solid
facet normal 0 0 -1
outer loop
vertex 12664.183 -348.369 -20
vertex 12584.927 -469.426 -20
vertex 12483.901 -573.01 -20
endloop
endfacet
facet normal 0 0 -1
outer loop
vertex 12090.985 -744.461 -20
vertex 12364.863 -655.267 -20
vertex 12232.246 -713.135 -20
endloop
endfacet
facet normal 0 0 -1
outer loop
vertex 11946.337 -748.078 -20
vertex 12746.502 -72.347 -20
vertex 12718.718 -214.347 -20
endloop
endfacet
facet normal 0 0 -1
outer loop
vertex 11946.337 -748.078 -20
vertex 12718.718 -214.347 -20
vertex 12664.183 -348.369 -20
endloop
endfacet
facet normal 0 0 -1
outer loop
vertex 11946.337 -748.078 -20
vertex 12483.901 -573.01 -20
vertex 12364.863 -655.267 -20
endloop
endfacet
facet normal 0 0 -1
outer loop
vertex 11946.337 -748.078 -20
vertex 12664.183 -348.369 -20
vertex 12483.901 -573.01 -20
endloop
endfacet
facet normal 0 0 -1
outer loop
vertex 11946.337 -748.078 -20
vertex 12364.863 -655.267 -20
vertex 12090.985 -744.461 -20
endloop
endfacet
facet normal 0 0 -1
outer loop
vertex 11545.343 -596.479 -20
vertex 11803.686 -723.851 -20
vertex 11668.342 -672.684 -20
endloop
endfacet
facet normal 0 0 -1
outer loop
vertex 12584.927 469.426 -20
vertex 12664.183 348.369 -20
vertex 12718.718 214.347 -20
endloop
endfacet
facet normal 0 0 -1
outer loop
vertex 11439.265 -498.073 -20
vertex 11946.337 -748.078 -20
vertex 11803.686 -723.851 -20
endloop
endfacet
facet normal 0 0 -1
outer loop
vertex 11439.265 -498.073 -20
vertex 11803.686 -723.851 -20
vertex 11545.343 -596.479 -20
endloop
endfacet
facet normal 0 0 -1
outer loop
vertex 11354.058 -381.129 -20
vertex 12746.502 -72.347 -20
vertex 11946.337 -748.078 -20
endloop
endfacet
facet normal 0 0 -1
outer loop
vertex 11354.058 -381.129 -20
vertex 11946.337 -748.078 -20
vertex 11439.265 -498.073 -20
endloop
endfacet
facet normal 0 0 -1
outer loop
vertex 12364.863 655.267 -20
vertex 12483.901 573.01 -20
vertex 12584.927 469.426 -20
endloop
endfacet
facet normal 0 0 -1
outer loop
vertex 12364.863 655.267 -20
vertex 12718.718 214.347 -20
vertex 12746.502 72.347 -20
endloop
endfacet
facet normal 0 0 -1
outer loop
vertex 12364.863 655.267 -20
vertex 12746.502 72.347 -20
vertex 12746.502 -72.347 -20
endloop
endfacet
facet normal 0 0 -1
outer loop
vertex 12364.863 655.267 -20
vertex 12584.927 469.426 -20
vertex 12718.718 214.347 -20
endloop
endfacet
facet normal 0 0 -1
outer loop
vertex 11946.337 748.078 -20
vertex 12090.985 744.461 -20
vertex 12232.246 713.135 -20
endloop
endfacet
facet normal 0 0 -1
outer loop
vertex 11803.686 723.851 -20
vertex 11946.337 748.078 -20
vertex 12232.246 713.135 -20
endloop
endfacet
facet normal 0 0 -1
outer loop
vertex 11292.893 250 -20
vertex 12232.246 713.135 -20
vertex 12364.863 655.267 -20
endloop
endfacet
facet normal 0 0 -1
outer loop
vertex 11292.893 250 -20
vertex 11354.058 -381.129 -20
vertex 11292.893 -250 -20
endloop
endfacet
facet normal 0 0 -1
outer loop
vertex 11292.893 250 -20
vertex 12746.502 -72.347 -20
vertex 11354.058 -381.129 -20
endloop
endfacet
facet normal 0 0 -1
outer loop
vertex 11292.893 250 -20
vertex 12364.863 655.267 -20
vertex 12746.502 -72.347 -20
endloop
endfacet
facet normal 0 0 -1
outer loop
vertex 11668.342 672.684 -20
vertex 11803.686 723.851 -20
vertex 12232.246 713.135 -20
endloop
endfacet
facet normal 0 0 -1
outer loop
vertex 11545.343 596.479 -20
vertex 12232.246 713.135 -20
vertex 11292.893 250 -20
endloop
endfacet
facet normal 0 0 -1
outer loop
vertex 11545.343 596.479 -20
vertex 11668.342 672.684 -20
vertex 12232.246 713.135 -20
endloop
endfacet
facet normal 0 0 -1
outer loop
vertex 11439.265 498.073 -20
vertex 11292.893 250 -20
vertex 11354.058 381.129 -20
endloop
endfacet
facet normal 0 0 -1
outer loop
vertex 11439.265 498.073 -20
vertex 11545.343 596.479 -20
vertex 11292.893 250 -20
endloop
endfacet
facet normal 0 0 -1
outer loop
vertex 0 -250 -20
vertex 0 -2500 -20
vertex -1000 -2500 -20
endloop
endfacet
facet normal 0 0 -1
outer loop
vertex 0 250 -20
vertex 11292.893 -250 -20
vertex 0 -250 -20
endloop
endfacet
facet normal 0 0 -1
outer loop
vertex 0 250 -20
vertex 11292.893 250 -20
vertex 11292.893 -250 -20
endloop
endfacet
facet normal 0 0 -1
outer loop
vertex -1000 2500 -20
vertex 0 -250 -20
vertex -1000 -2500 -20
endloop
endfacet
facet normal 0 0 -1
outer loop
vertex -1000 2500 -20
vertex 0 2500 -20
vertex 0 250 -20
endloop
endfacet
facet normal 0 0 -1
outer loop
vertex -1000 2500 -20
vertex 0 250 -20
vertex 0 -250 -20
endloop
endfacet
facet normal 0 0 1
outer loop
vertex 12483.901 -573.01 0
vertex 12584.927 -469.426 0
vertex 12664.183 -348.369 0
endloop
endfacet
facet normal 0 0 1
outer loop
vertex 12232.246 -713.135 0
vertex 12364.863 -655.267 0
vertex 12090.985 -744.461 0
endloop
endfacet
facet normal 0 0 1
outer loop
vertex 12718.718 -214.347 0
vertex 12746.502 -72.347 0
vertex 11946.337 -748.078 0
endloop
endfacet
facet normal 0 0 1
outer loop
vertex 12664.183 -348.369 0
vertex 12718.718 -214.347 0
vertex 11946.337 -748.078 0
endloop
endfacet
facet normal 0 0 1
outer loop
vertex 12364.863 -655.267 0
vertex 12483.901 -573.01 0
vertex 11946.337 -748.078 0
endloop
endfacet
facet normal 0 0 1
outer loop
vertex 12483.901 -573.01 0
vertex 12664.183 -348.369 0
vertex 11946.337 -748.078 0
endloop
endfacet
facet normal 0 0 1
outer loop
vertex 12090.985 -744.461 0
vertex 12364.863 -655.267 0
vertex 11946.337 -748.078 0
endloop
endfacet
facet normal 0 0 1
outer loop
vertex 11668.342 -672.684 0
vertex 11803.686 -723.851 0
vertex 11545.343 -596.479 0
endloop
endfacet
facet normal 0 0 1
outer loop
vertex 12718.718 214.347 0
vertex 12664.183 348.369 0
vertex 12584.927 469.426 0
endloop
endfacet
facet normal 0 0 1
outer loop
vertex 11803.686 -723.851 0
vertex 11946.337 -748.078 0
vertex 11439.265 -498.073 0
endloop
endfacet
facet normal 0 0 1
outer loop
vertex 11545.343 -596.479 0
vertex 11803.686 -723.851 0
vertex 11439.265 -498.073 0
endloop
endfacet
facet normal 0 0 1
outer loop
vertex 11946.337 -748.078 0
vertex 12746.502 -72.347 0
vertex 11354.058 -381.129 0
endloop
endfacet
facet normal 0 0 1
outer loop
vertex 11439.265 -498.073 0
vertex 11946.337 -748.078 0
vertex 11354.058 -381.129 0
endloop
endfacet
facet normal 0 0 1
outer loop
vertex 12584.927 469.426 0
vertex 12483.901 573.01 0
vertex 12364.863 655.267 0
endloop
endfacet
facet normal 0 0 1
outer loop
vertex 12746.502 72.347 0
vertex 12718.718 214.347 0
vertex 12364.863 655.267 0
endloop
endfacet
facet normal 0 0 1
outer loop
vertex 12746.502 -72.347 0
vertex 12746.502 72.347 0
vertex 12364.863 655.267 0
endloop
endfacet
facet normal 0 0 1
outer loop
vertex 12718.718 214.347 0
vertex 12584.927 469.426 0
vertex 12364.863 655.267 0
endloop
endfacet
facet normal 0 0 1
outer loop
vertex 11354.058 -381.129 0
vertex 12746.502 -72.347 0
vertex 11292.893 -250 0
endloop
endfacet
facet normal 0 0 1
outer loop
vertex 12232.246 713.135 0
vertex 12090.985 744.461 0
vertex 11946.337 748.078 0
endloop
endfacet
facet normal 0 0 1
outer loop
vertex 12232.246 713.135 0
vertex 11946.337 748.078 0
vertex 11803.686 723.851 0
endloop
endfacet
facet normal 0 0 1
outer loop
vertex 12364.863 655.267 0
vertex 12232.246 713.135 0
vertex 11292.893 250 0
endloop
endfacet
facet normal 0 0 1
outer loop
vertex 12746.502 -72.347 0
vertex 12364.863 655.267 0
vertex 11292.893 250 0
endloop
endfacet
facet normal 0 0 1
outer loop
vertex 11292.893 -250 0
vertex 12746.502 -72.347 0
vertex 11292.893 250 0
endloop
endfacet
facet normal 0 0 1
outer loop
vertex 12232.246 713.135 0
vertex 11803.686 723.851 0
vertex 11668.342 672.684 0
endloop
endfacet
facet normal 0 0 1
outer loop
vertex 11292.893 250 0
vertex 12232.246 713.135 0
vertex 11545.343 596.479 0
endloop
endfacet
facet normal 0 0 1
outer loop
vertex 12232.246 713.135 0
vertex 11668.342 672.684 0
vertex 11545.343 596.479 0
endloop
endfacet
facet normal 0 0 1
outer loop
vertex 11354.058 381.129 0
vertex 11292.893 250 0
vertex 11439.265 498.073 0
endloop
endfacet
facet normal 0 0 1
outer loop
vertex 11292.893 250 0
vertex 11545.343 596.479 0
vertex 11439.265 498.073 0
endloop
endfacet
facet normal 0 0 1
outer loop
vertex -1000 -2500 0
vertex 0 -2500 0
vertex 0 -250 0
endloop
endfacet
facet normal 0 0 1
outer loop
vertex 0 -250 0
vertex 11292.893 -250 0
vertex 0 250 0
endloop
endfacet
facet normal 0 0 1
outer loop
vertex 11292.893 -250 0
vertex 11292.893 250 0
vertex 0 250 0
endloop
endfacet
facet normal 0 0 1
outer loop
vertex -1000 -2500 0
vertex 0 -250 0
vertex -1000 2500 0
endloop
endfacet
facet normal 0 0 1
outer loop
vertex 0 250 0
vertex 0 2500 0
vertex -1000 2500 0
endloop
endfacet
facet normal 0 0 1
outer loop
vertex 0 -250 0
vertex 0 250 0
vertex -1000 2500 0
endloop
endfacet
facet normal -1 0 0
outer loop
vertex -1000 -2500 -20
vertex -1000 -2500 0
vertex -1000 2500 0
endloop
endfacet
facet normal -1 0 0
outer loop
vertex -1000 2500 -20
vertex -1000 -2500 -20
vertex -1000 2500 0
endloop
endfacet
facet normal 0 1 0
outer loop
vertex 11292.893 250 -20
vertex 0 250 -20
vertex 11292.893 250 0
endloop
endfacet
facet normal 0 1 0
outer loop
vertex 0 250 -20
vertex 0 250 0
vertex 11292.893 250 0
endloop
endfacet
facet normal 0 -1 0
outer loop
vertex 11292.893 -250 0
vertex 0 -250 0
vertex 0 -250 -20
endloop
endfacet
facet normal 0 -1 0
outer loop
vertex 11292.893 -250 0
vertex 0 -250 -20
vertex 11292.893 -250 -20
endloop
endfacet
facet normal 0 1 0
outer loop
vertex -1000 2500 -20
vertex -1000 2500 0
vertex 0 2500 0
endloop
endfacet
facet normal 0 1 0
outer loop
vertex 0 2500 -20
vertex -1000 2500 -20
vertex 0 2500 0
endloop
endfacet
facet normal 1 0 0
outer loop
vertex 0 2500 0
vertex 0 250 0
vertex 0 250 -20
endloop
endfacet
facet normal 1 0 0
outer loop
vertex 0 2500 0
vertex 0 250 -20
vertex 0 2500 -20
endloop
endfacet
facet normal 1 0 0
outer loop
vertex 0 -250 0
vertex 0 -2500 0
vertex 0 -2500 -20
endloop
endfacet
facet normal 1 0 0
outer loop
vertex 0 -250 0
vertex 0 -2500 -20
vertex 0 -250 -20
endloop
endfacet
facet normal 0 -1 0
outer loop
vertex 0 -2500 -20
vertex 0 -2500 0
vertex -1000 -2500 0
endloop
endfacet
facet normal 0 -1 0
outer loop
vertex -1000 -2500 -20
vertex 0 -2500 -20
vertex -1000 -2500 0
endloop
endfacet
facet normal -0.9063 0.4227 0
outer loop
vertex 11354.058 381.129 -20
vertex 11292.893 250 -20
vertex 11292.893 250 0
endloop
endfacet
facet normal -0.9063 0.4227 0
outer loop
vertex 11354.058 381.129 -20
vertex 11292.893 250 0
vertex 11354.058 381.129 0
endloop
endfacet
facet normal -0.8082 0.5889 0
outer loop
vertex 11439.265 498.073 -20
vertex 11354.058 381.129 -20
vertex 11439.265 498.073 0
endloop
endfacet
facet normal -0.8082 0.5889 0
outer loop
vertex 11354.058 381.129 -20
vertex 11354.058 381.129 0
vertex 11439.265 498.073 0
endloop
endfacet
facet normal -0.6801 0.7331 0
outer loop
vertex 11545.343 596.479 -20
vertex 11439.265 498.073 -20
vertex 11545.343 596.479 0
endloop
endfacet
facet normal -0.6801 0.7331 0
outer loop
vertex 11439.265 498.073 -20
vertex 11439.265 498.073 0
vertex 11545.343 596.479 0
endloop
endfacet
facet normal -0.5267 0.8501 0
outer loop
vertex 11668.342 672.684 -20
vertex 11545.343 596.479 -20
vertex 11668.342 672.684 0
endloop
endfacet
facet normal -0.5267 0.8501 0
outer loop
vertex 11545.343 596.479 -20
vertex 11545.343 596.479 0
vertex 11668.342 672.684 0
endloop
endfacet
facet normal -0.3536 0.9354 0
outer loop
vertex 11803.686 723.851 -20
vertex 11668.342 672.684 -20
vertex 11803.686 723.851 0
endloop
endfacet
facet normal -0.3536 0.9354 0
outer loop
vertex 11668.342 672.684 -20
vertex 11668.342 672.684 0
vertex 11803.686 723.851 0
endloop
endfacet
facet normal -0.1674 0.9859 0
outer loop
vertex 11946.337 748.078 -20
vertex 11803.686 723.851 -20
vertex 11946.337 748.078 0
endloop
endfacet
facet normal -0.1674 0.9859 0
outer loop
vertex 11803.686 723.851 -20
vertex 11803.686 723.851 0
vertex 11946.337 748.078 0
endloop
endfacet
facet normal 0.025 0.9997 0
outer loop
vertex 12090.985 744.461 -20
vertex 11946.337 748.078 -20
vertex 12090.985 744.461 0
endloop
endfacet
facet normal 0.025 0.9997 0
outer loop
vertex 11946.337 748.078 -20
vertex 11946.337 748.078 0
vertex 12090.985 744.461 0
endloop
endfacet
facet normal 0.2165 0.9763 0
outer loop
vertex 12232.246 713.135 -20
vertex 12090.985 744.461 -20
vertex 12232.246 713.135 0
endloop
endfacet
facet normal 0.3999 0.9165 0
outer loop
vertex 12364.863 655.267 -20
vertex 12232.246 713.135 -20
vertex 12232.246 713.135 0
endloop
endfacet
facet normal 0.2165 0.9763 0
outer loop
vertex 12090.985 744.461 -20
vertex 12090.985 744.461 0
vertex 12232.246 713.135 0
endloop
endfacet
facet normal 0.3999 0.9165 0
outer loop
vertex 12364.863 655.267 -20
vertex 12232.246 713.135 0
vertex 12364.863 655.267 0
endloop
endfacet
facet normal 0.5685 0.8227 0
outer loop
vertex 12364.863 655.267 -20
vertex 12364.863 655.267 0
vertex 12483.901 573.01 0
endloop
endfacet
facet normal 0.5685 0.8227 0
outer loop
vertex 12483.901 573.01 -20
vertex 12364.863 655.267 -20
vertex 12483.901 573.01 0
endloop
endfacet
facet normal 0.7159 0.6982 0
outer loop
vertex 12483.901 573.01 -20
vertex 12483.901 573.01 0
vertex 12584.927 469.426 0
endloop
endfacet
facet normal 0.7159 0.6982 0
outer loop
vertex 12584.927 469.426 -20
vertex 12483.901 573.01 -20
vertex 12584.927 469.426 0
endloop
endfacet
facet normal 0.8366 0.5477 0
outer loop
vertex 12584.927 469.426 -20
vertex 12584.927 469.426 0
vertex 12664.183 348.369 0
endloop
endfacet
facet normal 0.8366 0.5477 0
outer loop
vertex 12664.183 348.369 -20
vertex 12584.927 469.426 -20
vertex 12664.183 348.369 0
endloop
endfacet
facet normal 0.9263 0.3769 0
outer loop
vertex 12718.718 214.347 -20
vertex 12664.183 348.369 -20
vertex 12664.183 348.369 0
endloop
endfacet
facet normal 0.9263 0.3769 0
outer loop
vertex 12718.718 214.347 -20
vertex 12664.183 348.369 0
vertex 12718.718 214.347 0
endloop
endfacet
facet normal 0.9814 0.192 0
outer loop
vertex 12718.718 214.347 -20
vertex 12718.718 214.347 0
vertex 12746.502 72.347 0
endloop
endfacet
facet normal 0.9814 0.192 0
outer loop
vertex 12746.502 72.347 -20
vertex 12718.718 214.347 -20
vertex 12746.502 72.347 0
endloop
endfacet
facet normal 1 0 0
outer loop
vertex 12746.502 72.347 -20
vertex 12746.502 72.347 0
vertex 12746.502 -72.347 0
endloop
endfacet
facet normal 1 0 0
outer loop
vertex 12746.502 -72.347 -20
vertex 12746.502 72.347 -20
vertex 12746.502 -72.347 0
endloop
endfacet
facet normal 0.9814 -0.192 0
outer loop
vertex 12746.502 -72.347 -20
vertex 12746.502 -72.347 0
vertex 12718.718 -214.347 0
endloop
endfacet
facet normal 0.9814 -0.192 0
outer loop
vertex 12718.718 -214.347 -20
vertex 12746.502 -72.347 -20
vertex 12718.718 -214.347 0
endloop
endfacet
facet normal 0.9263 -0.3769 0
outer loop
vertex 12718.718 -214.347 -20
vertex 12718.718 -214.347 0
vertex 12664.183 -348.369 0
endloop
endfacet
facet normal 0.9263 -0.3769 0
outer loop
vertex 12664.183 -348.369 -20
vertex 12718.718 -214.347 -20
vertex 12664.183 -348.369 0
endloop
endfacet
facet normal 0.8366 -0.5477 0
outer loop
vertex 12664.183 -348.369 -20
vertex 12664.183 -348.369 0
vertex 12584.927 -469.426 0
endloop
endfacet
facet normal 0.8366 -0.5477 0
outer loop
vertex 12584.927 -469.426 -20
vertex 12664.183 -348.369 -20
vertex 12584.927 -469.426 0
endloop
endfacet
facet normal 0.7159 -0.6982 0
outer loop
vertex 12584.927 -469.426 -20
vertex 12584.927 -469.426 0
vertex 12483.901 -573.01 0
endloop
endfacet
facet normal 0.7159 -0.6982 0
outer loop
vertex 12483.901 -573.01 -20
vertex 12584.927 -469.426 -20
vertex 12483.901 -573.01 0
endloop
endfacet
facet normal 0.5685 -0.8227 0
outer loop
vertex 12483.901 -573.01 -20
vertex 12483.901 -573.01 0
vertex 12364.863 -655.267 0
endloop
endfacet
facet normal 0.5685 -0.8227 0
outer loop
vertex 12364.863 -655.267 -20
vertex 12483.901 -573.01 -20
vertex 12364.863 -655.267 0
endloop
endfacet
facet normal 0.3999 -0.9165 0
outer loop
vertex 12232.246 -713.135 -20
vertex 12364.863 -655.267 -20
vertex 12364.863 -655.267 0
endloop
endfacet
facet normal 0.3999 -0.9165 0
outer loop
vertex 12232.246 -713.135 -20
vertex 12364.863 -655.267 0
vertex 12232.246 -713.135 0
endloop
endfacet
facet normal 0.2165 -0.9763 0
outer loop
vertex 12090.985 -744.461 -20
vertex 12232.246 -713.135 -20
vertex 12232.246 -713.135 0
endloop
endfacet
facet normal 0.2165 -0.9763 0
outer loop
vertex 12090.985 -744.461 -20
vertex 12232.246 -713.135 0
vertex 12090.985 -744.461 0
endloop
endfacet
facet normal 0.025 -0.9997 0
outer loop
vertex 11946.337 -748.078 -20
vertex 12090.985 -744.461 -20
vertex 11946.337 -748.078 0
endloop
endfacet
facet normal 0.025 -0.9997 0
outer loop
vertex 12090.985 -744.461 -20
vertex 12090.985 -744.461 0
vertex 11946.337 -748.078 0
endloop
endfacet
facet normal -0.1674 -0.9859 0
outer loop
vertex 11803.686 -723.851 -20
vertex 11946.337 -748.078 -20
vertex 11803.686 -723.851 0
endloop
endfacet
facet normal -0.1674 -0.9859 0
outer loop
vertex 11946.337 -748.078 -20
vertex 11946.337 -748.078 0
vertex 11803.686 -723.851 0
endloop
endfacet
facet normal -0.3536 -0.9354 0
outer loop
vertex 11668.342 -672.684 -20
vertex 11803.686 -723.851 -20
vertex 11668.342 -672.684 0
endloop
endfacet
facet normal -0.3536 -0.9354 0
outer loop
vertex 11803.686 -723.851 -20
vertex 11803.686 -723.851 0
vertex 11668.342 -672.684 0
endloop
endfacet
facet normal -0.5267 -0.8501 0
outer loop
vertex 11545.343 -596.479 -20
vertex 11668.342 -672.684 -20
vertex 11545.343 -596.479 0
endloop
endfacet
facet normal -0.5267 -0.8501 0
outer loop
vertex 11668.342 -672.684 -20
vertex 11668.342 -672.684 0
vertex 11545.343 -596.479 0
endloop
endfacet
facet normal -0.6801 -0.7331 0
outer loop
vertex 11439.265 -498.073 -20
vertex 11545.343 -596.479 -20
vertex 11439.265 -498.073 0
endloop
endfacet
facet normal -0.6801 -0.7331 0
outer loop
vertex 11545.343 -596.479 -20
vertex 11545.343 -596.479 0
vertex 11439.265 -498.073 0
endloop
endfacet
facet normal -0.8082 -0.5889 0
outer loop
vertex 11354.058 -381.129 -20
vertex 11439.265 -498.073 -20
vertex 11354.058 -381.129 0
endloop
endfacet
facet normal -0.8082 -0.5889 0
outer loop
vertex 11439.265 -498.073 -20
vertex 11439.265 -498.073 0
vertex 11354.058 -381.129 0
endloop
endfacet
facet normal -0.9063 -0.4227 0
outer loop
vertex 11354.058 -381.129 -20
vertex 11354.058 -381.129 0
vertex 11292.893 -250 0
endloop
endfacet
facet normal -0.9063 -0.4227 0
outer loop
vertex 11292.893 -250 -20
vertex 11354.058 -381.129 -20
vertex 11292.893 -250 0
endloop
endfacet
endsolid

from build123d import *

# Parameters (mm, degrees)
BOSS_EXTRUDE1_DEPTH = 20
SKETCH2_W           = 1000
SKETCH2_H           = 2250
CUT_EXTRUDE1_DEPTH  = 12993.801853334
CUT_EXTRUDE4_DEPTH  = 12993.801853334
SKETCH5_W           = 11500
SKETCH5_H           = 500
BOSS_EXTRUDE2_DEPTH = 20


with BuildPart() as part:
    # Sketch1 → Boss-Extrude1 (new body)
    with BuildSketch(Plane.XY):
        with BuildLine():
            Line((1000, 250), (5000, 250))
            Line((5000, 250), (5000, 125))
            Line((5000, 125), (9000, 125))
            Line((9000, 125), (9000, 100))
            Line((9000, 100), (11256.696562634, 100))
            ThreePointArc((11256.696562634, 100), (12750, 0), (11256.696562634, -100))
            Line((11256.696562634, -100), (9000, -100))
            Line((9000, -100), (9000, -125))
            Line((9000, -125), (5000, -125))
            Line((5000, -125), (5000, -250))
            Line((5000, -250), (1000, -250))
            Line((1000, -250), (1000, -2500))
            Line((1000, -2500), (-1000, -2500))
            Line((-1000, -2500), (-1000, 2500))
            Line((-1000, 2500), (1000, 2500))
            Line((1000, 2500), (1000, 250))
        make_face()
    extrude(amount=-BOSS_EXTRUDE1_DEPTH)

    # Sketch2 → Cut-Extrude1 (cut, through all)
    with BuildSketch(Plane.XY):
        with Locations((500, 1375)):
            Rectangle(SKETCH2_W, SKETCH2_H)
        with Locations((500, -1375)):
            Rectangle(SKETCH2_W, SKETCH2_H)
    extrude(amount=-CUT_EXTRUDE1_DEPTH, mode=Mode.SUBTRACT)

    # Sketch3 → Cut-Extrude4 (cut, through all)
    with BuildSketch(Plane.XY):
        Polygon((1500, -250), (3250, -250), (5000, -250), (5000, -150), (3250, -150), (3250, -200), (1500, -200), align=None)
    cut_extrude4 = extrude(amount=-CUT_EXTRUDE4_DEPTH, mode=Mode.SUBTRACT)

    # Mirror1: Cut-Extrude4 across plane
    add(cut_extrude4.mirror(Plane.ZX), mode=Mode.SUBTRACT)

    # Sketch5 → Boss-Extrude2 (add)
    with BuildSketch(Plane.XY):
        with Locations((5750, 0)):
            Rectangle(SKETCH5_W, SKETCH5_H)
    extrude(amount=-BOSS_EXTRUDE2_DEPTH)


solid = part.part
